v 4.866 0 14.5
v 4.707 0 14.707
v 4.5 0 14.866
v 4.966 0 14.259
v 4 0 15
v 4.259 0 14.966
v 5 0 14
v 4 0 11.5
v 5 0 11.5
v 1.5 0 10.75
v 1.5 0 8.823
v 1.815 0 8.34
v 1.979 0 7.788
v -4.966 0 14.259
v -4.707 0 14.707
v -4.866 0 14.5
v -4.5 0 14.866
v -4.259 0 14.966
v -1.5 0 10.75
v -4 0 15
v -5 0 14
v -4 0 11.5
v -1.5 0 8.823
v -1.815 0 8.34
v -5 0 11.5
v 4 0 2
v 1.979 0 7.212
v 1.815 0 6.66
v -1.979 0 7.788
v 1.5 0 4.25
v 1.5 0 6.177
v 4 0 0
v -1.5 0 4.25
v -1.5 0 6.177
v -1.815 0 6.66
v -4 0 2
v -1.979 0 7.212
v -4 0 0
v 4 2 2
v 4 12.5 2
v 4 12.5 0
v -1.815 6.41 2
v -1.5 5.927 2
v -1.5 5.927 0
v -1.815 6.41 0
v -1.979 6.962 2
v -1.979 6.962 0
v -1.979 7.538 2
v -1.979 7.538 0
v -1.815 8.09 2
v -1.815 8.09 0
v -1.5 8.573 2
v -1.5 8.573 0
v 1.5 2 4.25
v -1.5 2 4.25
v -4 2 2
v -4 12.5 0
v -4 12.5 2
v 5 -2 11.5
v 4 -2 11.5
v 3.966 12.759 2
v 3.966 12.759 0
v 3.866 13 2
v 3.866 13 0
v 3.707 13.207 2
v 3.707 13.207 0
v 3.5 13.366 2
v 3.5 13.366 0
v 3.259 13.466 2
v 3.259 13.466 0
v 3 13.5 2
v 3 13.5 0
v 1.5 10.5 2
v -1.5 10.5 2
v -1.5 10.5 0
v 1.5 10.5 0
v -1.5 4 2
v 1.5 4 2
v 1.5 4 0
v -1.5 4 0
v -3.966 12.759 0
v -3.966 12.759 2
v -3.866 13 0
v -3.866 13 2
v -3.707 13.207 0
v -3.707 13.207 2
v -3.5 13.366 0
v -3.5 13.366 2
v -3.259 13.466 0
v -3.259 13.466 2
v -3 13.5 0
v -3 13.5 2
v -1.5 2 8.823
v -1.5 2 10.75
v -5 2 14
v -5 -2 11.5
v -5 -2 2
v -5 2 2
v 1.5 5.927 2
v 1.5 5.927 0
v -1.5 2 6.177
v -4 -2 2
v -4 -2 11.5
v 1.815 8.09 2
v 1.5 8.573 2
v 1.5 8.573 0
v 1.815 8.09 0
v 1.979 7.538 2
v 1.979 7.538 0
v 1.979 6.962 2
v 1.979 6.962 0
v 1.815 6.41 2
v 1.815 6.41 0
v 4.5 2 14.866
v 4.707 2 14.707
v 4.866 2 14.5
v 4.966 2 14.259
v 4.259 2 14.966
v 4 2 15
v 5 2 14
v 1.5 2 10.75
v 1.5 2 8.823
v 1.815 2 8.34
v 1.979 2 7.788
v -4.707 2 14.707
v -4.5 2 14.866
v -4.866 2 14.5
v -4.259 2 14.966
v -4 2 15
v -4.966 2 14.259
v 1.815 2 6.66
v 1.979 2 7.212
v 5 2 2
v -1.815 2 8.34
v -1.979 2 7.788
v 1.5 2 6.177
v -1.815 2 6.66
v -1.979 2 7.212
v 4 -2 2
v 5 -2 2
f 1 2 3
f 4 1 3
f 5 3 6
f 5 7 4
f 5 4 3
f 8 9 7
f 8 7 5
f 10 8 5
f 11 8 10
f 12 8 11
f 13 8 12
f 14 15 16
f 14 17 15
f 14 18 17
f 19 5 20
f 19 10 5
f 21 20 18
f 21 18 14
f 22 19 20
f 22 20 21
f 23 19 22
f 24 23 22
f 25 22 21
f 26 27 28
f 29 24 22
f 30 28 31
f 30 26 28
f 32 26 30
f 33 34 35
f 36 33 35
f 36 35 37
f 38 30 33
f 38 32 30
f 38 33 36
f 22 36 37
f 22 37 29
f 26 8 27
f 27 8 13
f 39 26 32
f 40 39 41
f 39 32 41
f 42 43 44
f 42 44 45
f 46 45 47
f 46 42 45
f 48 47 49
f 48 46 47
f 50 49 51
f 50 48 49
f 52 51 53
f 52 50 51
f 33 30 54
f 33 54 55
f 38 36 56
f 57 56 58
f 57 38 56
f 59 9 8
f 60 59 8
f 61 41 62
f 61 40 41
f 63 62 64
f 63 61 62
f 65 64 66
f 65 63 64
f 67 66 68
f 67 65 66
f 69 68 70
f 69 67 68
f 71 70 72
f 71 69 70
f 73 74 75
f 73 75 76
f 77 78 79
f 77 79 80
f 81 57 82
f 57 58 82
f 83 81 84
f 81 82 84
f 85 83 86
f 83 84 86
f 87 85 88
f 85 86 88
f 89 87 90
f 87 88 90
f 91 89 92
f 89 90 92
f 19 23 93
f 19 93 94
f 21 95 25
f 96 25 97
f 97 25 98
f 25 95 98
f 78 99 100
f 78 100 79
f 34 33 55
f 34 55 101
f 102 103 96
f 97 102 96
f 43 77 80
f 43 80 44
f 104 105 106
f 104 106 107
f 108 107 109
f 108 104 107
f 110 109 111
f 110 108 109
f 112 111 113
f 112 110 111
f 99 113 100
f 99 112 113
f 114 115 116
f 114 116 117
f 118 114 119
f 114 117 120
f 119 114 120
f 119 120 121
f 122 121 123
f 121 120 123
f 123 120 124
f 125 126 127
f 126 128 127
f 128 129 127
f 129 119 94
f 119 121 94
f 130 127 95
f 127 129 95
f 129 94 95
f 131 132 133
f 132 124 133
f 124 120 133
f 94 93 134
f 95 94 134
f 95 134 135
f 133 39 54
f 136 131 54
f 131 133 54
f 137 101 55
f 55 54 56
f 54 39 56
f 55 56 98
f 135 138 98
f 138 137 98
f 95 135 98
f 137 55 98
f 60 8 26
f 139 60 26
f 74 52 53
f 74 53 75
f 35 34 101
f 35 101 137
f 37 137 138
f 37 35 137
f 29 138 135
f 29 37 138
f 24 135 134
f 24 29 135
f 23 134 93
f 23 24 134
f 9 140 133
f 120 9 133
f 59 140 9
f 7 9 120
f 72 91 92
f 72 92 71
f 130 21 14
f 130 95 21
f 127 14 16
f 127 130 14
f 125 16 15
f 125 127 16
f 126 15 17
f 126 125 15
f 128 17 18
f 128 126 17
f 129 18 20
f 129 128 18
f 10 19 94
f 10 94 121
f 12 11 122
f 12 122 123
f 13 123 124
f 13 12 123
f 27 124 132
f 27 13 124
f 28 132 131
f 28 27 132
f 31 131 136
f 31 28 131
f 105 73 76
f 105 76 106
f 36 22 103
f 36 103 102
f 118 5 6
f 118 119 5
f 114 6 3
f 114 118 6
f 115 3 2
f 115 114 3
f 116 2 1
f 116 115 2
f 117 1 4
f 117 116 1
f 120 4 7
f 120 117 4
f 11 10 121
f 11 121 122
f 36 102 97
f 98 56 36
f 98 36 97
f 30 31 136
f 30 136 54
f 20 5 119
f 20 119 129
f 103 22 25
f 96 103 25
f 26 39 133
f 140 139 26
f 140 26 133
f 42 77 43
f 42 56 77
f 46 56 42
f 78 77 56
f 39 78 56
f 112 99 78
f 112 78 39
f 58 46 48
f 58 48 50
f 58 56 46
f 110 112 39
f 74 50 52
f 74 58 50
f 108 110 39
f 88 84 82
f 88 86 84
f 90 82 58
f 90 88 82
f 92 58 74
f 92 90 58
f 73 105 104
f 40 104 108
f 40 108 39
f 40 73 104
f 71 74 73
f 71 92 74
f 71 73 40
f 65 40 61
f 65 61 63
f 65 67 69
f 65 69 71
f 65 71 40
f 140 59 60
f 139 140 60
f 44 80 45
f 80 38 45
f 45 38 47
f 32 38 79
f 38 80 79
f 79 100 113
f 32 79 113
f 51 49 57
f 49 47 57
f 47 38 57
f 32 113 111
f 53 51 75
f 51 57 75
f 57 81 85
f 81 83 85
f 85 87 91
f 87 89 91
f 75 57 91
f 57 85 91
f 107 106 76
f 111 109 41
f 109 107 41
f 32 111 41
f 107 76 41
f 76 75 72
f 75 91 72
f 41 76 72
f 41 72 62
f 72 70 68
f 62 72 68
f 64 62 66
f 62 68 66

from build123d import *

# Parameters (mm, degrees)
SKETCH_1_W          = 8
SKETCH_1_H          = 13.5
EXTRUDE_1_DEPTH     = 2
EXTRUDE_2_DEPTH     = 2
SKETCH_3_W          = 1
SKETCH_3_H          = 9.5
EXTRUDE_3_DEPTH     = 2
CUT_EXTRUDE_1_REACH = 22.791
CUT_EXTRUDE_2_REACH = 21.397
FILLET_1_R          = 1


with BuildPart() as part:
    # 草图1 → 凸台-拉伸1 (new body)
    with BuildSketch(Plane.XY):
        with Locations((0, 6.75)):
            Rectangle(SKETCH_1_W, SKETCH_1_H)
    extrude(amount=EXTRUDE_1_DEPTH)

    # 草图2 → 凸台-拉伸2 (add)
    with BuildSketch(Plane(origin=(0, 0, 0), x_dir=(-1, 0, 0), z_dir=(0, -1, 0))):
        Polygon((-4, -2), (-5, -2), (-5, -15), (5, -15), (5, -2), (4, -2), (4, 0), (-4, 0), align=None)
    extrude(amount=-EXTRUDE_2_DEPTH)

    # 草图3 → 凸台-拉伸3 (add)
    with BuildSketch(Plane(origin=(0, 0, 0), x_dir=(-1, 0, 0), z_dir=(0, -1, 0))):
        with Locations((4.5, -6.75)):
            Rectangle(SKETCH_3_W, SKETCH_3_H)
        with Locations((-4.5, -6.75)):
            Rectangle(SKETCH_3_W, SKETCH_3_H)
    extrude(amount=EXTRUDE_3_DEPTH)

    # 草图4 → 切除-拉伸1 (cut, up to next)
    with BuildSketch(Plane(origin=(0, 0, 0), x_dir=(-1, 0, 0), z_dir=(0, -1, 0)), mode=Mode.PRIVATE) as cut_extrude_1_sk1:
        with BuildLine():
            Line((1.5, -8.822875656), (1.5, -10.75))
            Line((1.5, -10.75), (-1.5, -10.75))
            Line((-1.5, -10.75), (-1.5, -8.822875656))
            ThreePointArc((-1.5, -8.822875656), (-2, -7.5), (-1.5, -6.177124344))
            Line((-1.5, -6.177124344), (-1.5, -4.25))
            Line((-1.5, -4.25), (1.5, -4.25))
            Line((1.5, -4.25), (1.5, -6.177124344))
            ThreePointArc((1.5, -6.177124344), (2, -7.5), (1.5, -8.822875656))
        make_face()
    cut_extrude_1_tool1 = extrude(cut_extrude_1_sk1.sketch, amount=-CUT_EXTRUDE_1_REACH, mode=Mode.PRIVATE) & part.part
    add(cut_extrude_1_tool1.solids().sort_by_distance((0, 0, 7.5))[0], mode=Mode.SUBTRACT)

    # 草图5 → 切除-拉伸2 (cut, up to next)
    with BuildSketch(Plane.XY.offset(2), mode=Mode.PRIVATE) as cut_extrude_2_sk1:
        with BuildLine():
            Line((-1.5, 8.572875656), (-1.5, 10.5))
            Line((-1.5, 10.5), (1.5, 10.5))
            Line((1.5, 10.5), (1.5, 8.572875656))
            ThreePointArc((1.5, 8.572875656), (2, 7.25), (1.5, 5.927124344))
            Line((1.5, 5.927124344), (1.5, 4))
            Line((1.5, 4), (-1.5, 4))
            Line((-1.5, 4), (-1.5, 5.927124344))
            ThreePointArc((-1.5, 5.927124344), (-2, 7.25), (-1.5, 8.572875656))
        make_face()
    cut_extrude_2_tool1 = extrude(cut_extrude_2_sk1.sketch, amount=-CUT_EXTRUDE_2_REACH, mode=Mode.PRIVATE) & part.part
    add(cut_extrude_2_tool1.solids().sort_by_distance((0, 7.25, 2))[0], mode=Mode.SUBTRACT)

    # 圆角1
    fillet_1_edges = [part.edges().sort_by_distance(p)[0] for p in [
        (-5, 1, 15),
        (5, 1, 15),
        (-4, 13.5, 1),
        (4, 13.5, 1),
    ]]
    fillet(fillet_1_edges, radius=FILLET_1_R)


solid = part.part
